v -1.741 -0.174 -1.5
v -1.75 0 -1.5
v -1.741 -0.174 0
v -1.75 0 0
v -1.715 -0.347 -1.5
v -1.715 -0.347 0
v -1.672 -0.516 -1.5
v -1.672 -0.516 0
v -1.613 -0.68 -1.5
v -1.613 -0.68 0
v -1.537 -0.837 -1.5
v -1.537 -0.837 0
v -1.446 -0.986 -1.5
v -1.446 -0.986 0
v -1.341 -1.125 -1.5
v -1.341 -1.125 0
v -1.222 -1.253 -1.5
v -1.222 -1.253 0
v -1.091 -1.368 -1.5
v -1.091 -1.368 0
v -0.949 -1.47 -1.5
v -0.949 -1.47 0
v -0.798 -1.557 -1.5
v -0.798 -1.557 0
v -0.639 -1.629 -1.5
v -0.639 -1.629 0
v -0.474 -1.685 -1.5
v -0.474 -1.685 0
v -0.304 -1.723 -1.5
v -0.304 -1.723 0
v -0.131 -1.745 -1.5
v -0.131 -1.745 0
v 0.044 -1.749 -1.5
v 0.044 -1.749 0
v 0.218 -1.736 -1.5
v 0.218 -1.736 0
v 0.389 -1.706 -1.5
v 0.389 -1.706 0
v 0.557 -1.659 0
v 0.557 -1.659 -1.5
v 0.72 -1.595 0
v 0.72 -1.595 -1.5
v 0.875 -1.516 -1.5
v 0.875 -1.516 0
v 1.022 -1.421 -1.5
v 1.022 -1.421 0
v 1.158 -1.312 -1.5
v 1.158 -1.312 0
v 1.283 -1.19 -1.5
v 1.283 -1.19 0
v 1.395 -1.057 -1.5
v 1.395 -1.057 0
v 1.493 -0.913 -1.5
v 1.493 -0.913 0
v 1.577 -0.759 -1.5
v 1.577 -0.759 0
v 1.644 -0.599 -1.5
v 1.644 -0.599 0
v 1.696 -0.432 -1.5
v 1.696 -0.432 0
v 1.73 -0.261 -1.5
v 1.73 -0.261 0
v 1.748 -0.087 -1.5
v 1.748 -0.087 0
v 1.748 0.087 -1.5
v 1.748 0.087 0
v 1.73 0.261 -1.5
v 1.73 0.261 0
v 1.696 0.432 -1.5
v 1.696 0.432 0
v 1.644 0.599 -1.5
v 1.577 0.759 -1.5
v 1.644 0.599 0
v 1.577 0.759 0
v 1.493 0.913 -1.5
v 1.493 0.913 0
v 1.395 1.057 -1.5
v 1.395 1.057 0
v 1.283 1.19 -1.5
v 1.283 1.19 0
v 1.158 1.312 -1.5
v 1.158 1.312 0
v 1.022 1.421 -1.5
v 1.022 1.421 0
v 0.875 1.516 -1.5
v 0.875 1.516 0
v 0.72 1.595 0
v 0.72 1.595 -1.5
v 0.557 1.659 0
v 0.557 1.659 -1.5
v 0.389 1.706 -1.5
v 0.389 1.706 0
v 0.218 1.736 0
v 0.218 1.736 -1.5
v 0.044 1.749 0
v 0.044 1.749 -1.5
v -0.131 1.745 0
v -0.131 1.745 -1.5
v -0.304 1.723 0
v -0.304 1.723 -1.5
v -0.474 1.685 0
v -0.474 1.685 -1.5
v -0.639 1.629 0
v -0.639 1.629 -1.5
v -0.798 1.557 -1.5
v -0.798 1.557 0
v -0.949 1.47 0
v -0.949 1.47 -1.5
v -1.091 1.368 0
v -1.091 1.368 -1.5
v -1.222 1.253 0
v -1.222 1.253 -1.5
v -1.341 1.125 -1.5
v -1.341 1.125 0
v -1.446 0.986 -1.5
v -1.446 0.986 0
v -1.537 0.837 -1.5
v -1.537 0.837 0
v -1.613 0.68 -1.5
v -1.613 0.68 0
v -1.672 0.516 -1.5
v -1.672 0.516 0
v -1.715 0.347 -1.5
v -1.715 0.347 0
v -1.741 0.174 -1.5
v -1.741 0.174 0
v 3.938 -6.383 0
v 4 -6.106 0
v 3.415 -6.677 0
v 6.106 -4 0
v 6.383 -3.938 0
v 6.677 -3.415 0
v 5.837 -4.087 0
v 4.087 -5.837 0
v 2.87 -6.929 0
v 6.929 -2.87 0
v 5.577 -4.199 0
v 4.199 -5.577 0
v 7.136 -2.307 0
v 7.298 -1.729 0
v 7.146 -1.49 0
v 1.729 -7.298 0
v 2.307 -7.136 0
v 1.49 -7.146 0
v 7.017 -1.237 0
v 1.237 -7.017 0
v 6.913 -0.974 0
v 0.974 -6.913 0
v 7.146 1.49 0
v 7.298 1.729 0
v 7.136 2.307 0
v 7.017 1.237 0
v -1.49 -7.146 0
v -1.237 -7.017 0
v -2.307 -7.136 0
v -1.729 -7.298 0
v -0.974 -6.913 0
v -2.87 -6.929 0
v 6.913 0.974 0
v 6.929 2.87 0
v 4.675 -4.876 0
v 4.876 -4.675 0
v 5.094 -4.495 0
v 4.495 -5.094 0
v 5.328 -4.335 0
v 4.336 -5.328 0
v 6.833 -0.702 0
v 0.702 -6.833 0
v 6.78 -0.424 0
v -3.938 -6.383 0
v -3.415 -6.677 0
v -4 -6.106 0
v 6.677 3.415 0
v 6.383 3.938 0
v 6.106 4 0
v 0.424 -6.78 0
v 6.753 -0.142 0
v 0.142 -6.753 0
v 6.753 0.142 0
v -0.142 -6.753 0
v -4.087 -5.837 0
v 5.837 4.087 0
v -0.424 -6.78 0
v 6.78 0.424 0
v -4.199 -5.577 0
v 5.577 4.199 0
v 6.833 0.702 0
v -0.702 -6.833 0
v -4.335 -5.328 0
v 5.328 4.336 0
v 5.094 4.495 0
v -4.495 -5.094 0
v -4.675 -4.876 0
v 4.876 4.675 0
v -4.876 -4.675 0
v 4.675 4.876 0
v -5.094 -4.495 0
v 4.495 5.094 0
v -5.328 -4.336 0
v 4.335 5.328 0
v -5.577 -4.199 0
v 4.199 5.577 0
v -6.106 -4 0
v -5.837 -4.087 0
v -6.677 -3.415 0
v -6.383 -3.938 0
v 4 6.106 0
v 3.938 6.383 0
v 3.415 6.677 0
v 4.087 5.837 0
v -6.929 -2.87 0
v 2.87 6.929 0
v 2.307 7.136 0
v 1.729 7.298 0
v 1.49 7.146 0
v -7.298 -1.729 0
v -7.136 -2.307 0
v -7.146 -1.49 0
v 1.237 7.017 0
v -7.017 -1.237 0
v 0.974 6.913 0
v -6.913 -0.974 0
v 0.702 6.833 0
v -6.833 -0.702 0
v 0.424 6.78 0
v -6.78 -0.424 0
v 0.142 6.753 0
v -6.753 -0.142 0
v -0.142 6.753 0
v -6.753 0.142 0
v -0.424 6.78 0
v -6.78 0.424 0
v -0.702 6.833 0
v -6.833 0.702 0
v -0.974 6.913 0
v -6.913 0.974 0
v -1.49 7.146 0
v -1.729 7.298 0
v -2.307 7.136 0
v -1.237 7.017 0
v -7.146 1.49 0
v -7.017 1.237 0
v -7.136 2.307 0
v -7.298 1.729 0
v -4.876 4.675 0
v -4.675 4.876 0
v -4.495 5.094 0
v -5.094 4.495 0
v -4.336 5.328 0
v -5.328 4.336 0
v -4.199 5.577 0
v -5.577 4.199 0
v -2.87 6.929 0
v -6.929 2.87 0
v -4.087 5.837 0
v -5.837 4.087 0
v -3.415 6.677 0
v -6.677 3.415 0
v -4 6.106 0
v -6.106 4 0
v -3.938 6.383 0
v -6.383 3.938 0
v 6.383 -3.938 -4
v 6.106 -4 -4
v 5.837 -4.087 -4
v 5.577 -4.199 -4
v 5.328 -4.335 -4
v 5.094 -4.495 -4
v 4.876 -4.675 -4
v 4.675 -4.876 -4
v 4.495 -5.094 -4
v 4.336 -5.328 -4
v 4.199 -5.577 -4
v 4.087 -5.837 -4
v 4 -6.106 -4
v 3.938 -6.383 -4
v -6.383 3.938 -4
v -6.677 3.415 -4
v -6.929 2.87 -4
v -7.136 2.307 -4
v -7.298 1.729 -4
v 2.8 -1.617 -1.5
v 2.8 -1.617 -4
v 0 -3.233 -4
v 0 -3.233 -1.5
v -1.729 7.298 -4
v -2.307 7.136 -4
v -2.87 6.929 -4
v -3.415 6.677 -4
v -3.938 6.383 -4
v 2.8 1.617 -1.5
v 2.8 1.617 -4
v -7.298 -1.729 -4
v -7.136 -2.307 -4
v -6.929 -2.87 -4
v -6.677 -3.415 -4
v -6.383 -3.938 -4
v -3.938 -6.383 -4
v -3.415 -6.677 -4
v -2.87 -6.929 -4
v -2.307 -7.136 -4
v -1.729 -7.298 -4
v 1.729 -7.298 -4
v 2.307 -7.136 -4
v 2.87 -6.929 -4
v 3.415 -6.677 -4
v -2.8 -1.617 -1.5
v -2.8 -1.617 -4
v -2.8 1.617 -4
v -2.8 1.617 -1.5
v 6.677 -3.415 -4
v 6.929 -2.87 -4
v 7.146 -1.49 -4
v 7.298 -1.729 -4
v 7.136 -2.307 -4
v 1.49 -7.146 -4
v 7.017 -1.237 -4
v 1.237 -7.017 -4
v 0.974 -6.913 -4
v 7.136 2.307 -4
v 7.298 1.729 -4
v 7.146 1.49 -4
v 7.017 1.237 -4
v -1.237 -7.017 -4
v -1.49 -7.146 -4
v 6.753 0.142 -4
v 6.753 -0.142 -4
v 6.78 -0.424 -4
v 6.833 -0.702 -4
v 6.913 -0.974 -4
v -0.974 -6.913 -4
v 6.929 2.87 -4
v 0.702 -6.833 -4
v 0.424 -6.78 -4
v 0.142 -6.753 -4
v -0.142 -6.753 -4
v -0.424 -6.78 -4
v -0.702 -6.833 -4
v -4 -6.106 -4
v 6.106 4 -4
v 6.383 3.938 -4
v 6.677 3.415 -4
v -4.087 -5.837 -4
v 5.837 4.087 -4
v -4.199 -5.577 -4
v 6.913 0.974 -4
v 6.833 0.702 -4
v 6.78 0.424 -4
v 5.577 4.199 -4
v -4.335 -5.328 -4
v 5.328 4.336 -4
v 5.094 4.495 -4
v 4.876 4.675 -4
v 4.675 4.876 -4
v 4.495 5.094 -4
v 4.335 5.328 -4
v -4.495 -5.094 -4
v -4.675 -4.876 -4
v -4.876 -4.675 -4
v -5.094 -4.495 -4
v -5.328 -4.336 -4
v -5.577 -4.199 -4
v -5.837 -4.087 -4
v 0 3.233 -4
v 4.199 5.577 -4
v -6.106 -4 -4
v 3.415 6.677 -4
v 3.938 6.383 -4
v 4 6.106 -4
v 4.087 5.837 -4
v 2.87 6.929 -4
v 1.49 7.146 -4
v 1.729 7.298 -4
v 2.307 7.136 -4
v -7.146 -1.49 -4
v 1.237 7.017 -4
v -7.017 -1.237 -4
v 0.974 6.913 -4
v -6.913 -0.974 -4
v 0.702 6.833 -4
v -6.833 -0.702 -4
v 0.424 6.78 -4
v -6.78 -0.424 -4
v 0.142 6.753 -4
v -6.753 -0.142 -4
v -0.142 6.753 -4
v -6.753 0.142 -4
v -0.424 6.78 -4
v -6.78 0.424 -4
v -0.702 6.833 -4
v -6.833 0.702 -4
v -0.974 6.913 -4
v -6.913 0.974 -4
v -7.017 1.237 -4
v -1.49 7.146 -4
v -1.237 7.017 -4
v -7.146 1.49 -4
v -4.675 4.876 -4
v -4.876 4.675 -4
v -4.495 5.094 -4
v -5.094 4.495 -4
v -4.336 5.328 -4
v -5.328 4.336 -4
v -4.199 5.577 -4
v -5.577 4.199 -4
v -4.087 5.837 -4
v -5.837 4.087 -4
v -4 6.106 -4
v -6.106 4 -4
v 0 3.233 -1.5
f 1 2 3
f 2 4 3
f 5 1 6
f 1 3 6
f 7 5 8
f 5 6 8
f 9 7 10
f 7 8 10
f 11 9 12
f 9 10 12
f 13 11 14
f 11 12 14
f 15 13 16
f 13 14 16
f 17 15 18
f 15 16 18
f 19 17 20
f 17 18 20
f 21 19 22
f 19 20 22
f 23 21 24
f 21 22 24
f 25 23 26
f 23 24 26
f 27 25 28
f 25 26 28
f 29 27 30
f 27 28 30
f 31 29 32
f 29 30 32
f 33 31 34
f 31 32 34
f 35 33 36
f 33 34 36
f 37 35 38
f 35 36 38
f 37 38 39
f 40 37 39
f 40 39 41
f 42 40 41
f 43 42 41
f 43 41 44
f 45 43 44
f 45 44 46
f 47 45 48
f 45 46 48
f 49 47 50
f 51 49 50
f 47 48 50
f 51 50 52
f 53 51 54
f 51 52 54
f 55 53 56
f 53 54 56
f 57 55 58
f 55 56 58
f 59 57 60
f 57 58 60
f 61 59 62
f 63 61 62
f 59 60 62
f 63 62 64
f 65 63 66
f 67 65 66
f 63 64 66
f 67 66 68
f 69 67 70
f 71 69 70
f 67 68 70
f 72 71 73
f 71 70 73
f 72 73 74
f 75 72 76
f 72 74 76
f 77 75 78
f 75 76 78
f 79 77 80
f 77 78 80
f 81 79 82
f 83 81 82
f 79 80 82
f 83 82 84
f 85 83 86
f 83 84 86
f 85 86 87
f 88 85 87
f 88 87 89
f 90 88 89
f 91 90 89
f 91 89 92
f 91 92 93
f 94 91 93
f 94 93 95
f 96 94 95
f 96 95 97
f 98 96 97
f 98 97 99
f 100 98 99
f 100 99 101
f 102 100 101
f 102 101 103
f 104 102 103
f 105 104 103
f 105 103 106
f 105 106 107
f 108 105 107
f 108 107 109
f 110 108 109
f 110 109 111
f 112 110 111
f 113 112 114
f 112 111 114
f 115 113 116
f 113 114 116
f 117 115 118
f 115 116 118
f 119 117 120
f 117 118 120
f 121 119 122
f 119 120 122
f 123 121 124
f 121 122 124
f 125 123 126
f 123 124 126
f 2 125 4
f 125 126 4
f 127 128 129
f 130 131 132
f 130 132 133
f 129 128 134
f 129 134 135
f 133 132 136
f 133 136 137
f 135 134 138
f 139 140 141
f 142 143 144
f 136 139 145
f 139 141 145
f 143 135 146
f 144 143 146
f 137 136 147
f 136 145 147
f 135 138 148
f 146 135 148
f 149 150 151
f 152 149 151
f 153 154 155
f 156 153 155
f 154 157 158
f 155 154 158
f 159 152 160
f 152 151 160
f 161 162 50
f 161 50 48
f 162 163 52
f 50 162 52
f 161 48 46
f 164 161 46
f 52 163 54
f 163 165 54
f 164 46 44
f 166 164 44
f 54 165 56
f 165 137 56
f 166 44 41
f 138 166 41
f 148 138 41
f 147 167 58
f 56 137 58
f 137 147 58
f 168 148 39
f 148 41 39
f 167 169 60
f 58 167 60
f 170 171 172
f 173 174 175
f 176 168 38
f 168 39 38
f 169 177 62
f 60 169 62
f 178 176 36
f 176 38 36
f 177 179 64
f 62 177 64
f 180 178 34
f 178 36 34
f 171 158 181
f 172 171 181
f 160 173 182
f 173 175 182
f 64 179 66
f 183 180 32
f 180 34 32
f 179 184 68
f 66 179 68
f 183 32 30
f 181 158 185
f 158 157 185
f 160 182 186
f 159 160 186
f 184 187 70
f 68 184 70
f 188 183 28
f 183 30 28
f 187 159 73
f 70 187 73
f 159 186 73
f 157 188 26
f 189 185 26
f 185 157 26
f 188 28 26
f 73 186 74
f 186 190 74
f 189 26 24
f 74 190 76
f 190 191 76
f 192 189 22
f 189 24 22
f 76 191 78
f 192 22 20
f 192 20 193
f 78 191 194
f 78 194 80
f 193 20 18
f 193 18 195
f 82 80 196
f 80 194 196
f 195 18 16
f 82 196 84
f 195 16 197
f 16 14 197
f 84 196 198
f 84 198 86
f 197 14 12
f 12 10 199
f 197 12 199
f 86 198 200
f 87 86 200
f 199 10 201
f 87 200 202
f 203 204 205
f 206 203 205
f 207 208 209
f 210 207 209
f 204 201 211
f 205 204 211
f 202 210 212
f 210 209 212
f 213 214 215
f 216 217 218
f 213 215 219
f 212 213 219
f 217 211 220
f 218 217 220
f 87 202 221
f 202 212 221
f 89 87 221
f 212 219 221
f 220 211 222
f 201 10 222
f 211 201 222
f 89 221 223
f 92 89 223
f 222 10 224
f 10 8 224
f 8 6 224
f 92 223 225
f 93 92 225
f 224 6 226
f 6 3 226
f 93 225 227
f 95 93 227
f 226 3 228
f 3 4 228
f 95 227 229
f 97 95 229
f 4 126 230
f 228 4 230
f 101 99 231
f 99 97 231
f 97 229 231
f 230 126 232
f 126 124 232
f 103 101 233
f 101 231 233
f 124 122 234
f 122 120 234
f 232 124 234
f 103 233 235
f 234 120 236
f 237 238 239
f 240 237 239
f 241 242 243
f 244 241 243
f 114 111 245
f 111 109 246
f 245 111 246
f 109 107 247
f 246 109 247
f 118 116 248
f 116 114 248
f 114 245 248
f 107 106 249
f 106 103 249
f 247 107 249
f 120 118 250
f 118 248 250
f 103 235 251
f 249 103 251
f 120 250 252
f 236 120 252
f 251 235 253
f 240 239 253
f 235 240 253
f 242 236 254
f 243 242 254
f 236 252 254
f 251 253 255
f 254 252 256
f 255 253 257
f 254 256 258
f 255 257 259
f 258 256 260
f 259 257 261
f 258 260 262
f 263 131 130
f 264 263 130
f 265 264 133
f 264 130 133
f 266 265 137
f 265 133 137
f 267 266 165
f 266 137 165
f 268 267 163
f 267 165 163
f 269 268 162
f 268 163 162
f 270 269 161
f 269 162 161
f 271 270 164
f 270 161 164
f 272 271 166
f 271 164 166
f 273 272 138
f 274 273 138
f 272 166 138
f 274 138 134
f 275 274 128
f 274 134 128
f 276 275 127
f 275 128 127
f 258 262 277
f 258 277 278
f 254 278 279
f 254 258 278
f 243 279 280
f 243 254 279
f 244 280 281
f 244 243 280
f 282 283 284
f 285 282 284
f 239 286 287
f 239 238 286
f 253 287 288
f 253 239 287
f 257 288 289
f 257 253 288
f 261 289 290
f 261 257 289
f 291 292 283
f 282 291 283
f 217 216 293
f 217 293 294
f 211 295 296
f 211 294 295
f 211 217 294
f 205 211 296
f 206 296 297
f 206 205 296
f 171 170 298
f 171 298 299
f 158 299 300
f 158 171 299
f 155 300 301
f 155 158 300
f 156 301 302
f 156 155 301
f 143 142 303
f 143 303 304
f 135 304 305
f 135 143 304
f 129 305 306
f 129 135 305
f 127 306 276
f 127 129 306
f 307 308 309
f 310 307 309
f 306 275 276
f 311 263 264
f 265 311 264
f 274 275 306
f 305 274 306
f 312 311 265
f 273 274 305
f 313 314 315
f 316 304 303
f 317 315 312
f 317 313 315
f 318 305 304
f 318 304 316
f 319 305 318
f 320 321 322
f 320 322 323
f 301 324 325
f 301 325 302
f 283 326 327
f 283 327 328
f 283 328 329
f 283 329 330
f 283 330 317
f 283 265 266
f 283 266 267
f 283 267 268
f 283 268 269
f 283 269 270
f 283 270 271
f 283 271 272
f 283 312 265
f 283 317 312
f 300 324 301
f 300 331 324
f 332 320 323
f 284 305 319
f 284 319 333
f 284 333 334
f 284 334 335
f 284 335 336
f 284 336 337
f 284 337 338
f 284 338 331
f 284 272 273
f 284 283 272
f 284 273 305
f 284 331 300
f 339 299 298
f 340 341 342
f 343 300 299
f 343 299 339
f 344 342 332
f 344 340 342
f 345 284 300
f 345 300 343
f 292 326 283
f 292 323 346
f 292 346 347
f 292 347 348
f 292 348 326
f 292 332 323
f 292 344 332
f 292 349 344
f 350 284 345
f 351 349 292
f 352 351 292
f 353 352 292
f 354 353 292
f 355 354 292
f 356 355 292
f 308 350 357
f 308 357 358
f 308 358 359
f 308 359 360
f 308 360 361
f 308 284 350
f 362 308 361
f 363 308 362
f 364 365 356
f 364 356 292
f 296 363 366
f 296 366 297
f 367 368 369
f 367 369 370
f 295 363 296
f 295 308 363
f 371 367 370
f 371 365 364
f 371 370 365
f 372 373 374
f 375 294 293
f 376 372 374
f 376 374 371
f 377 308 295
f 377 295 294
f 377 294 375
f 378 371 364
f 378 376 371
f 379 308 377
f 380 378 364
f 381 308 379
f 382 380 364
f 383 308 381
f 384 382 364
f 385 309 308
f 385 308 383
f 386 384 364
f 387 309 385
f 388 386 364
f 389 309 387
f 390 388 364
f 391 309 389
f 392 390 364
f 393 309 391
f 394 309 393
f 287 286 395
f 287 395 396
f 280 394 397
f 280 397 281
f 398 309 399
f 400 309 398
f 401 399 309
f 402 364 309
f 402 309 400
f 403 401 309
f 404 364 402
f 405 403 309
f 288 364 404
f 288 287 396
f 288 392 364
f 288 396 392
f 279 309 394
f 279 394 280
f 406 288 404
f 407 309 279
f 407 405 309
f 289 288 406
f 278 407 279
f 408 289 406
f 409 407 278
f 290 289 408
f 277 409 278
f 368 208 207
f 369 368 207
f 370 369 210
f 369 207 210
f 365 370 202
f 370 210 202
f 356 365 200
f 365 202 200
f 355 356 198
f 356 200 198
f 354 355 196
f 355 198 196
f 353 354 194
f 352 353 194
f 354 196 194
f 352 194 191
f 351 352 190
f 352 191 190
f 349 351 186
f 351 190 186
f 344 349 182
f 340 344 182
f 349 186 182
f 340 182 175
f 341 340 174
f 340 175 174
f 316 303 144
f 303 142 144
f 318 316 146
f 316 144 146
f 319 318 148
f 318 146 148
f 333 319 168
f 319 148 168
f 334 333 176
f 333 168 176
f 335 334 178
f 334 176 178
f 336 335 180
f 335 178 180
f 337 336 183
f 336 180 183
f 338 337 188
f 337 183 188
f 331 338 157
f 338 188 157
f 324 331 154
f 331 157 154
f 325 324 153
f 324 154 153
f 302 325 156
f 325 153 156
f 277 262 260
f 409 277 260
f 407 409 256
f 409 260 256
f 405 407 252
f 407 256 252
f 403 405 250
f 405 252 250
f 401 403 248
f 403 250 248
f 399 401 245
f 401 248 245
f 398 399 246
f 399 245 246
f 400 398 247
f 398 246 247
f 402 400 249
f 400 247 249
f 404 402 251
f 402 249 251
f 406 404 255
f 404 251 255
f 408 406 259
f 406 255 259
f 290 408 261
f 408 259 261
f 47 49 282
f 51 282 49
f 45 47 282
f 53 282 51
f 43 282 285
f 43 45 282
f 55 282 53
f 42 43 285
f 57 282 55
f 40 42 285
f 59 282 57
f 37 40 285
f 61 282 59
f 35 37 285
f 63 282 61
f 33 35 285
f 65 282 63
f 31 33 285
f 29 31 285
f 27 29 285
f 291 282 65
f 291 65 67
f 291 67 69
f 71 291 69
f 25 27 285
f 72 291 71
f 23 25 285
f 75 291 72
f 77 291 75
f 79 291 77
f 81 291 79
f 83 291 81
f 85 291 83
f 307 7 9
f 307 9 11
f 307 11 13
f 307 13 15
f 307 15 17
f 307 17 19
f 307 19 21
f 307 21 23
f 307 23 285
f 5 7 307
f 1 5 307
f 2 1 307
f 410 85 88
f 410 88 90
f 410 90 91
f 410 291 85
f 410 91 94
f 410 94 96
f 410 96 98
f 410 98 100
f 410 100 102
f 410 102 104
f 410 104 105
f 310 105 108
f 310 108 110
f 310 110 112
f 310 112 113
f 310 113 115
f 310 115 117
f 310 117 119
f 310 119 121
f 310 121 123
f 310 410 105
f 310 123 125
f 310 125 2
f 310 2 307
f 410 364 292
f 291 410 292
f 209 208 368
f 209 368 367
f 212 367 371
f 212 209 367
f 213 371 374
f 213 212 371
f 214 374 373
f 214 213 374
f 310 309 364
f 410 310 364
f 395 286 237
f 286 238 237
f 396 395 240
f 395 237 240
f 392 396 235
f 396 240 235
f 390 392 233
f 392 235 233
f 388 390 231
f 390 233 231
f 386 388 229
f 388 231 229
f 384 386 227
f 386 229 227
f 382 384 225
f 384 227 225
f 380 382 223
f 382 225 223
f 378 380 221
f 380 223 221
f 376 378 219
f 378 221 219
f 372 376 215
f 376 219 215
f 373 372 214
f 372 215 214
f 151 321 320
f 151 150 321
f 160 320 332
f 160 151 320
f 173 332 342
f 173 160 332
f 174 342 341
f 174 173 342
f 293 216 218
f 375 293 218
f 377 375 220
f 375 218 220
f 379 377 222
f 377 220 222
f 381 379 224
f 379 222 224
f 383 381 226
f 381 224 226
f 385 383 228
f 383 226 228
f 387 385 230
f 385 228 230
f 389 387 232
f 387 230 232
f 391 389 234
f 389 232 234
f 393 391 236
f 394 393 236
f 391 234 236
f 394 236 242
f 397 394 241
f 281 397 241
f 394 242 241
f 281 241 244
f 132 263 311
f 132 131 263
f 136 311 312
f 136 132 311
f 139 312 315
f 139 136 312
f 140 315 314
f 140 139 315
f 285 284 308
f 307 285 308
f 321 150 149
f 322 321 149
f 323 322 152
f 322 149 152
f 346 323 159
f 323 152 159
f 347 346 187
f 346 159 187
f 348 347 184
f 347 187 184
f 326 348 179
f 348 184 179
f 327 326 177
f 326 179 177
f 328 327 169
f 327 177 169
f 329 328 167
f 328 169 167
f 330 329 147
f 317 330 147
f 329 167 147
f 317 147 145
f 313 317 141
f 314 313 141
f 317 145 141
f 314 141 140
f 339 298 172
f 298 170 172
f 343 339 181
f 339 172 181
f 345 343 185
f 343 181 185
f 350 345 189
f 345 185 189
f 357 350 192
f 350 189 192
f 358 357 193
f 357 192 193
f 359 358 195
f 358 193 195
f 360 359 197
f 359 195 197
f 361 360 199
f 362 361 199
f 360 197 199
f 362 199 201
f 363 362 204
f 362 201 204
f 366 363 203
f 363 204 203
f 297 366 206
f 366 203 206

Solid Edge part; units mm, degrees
sketch "Sketch1" plane through (0, 0, 0) normal (0, 0, -1) x (-1, 0, 0)
  arc A0 (3.9382, 6.3828) -> (1.7286, 7.2981) centre (0, 0) ccw
  arc A1 (1.7286, 7.2981) -> (-1.7286, 7.2981) centre (0, 9.75) cw
  arc A2 (-1.7286, 7.2981) -> (-3.9382, 6.3828) centre (0, 0) ccw
  arc A3 (-3.9382, 6.3828) -> (-6.3828, 3.9382) centre (-6.8943, 6.8943) cw
  arc A4 (-6.3828, 3.9382) -> (-7.2981, 1.7286) centre (0, 0) ccw
  arc A5 (-7.2981, 1.7286) -> (-7.2981, -1.7286) centre (-9.75, 0) cw
  arc A6 (-7.2981, -1.7286) -> (-6.3828, -3.9382) centre (0, 0) ccw
  arc A7 (-6.3828, -3.9382) -> (-3.9382, -6.3828) centre (-6.8943, -6.8943) cw
  arc A8 (-3.9382, -6.3828) -> (-1.7286, -7.2981) centre (0, 0) ccw
  arc A9 (-1.7286, -7.2981) -> (1.7286, -7.2981) centre (0, -9.75) cw
  arc A10 (1.7286, -7.2981) -> (3.9382, -6.3828) centre (0, 0) ccw
  arc A11 (3.9382, -6.3828) -> (6.3828, -3.9382) centre (6.8943, -6.8943) cw
  arc A12 (6.3828, -3.9382) -> (7.2981, -1.7286) centre (0, 0) ccw
  arc A13 (7.2981, -1.7286) -> (7.2981, 1.7286) centre (9.75, 0) cw
  arc A14 (7.2981, 1.7286) -> (6.3828, 3.9382) centre (0, 0) ccw
  arc A15 (6.3828, 3.9382) -> (3.9382, 6.3828) centre (6.8943, 6.8943) cw
  circle A16 centre (0, 0) radius 1.75
extrude "Protrusion1" add sketch "Sketch1" along normal blind 4
sketch "Sketch2" plane through (0, 0, -4) normal (0, 0, -1) x (1, 0, 0)
  line L0 (2.8, 1.6166) -> (0, 3.2332)
  line L1 (0, 3.2332) -> (-2.8, 1.6166)
  line L2 (-2.8, 1.6166) -> (-2.8, -1.6166)
  line L3 (-2.8, -1.6166) -> (0, -3.2332)
  line L4 (0, -3.2332) -> (2.8, -1.6166)
  line L5 (2.8, -1.6166) -> (2.8, 1.6166)
extrude "ExtrudedCutout_1" cut sketch "Sketch2" against normal blind 2.5
